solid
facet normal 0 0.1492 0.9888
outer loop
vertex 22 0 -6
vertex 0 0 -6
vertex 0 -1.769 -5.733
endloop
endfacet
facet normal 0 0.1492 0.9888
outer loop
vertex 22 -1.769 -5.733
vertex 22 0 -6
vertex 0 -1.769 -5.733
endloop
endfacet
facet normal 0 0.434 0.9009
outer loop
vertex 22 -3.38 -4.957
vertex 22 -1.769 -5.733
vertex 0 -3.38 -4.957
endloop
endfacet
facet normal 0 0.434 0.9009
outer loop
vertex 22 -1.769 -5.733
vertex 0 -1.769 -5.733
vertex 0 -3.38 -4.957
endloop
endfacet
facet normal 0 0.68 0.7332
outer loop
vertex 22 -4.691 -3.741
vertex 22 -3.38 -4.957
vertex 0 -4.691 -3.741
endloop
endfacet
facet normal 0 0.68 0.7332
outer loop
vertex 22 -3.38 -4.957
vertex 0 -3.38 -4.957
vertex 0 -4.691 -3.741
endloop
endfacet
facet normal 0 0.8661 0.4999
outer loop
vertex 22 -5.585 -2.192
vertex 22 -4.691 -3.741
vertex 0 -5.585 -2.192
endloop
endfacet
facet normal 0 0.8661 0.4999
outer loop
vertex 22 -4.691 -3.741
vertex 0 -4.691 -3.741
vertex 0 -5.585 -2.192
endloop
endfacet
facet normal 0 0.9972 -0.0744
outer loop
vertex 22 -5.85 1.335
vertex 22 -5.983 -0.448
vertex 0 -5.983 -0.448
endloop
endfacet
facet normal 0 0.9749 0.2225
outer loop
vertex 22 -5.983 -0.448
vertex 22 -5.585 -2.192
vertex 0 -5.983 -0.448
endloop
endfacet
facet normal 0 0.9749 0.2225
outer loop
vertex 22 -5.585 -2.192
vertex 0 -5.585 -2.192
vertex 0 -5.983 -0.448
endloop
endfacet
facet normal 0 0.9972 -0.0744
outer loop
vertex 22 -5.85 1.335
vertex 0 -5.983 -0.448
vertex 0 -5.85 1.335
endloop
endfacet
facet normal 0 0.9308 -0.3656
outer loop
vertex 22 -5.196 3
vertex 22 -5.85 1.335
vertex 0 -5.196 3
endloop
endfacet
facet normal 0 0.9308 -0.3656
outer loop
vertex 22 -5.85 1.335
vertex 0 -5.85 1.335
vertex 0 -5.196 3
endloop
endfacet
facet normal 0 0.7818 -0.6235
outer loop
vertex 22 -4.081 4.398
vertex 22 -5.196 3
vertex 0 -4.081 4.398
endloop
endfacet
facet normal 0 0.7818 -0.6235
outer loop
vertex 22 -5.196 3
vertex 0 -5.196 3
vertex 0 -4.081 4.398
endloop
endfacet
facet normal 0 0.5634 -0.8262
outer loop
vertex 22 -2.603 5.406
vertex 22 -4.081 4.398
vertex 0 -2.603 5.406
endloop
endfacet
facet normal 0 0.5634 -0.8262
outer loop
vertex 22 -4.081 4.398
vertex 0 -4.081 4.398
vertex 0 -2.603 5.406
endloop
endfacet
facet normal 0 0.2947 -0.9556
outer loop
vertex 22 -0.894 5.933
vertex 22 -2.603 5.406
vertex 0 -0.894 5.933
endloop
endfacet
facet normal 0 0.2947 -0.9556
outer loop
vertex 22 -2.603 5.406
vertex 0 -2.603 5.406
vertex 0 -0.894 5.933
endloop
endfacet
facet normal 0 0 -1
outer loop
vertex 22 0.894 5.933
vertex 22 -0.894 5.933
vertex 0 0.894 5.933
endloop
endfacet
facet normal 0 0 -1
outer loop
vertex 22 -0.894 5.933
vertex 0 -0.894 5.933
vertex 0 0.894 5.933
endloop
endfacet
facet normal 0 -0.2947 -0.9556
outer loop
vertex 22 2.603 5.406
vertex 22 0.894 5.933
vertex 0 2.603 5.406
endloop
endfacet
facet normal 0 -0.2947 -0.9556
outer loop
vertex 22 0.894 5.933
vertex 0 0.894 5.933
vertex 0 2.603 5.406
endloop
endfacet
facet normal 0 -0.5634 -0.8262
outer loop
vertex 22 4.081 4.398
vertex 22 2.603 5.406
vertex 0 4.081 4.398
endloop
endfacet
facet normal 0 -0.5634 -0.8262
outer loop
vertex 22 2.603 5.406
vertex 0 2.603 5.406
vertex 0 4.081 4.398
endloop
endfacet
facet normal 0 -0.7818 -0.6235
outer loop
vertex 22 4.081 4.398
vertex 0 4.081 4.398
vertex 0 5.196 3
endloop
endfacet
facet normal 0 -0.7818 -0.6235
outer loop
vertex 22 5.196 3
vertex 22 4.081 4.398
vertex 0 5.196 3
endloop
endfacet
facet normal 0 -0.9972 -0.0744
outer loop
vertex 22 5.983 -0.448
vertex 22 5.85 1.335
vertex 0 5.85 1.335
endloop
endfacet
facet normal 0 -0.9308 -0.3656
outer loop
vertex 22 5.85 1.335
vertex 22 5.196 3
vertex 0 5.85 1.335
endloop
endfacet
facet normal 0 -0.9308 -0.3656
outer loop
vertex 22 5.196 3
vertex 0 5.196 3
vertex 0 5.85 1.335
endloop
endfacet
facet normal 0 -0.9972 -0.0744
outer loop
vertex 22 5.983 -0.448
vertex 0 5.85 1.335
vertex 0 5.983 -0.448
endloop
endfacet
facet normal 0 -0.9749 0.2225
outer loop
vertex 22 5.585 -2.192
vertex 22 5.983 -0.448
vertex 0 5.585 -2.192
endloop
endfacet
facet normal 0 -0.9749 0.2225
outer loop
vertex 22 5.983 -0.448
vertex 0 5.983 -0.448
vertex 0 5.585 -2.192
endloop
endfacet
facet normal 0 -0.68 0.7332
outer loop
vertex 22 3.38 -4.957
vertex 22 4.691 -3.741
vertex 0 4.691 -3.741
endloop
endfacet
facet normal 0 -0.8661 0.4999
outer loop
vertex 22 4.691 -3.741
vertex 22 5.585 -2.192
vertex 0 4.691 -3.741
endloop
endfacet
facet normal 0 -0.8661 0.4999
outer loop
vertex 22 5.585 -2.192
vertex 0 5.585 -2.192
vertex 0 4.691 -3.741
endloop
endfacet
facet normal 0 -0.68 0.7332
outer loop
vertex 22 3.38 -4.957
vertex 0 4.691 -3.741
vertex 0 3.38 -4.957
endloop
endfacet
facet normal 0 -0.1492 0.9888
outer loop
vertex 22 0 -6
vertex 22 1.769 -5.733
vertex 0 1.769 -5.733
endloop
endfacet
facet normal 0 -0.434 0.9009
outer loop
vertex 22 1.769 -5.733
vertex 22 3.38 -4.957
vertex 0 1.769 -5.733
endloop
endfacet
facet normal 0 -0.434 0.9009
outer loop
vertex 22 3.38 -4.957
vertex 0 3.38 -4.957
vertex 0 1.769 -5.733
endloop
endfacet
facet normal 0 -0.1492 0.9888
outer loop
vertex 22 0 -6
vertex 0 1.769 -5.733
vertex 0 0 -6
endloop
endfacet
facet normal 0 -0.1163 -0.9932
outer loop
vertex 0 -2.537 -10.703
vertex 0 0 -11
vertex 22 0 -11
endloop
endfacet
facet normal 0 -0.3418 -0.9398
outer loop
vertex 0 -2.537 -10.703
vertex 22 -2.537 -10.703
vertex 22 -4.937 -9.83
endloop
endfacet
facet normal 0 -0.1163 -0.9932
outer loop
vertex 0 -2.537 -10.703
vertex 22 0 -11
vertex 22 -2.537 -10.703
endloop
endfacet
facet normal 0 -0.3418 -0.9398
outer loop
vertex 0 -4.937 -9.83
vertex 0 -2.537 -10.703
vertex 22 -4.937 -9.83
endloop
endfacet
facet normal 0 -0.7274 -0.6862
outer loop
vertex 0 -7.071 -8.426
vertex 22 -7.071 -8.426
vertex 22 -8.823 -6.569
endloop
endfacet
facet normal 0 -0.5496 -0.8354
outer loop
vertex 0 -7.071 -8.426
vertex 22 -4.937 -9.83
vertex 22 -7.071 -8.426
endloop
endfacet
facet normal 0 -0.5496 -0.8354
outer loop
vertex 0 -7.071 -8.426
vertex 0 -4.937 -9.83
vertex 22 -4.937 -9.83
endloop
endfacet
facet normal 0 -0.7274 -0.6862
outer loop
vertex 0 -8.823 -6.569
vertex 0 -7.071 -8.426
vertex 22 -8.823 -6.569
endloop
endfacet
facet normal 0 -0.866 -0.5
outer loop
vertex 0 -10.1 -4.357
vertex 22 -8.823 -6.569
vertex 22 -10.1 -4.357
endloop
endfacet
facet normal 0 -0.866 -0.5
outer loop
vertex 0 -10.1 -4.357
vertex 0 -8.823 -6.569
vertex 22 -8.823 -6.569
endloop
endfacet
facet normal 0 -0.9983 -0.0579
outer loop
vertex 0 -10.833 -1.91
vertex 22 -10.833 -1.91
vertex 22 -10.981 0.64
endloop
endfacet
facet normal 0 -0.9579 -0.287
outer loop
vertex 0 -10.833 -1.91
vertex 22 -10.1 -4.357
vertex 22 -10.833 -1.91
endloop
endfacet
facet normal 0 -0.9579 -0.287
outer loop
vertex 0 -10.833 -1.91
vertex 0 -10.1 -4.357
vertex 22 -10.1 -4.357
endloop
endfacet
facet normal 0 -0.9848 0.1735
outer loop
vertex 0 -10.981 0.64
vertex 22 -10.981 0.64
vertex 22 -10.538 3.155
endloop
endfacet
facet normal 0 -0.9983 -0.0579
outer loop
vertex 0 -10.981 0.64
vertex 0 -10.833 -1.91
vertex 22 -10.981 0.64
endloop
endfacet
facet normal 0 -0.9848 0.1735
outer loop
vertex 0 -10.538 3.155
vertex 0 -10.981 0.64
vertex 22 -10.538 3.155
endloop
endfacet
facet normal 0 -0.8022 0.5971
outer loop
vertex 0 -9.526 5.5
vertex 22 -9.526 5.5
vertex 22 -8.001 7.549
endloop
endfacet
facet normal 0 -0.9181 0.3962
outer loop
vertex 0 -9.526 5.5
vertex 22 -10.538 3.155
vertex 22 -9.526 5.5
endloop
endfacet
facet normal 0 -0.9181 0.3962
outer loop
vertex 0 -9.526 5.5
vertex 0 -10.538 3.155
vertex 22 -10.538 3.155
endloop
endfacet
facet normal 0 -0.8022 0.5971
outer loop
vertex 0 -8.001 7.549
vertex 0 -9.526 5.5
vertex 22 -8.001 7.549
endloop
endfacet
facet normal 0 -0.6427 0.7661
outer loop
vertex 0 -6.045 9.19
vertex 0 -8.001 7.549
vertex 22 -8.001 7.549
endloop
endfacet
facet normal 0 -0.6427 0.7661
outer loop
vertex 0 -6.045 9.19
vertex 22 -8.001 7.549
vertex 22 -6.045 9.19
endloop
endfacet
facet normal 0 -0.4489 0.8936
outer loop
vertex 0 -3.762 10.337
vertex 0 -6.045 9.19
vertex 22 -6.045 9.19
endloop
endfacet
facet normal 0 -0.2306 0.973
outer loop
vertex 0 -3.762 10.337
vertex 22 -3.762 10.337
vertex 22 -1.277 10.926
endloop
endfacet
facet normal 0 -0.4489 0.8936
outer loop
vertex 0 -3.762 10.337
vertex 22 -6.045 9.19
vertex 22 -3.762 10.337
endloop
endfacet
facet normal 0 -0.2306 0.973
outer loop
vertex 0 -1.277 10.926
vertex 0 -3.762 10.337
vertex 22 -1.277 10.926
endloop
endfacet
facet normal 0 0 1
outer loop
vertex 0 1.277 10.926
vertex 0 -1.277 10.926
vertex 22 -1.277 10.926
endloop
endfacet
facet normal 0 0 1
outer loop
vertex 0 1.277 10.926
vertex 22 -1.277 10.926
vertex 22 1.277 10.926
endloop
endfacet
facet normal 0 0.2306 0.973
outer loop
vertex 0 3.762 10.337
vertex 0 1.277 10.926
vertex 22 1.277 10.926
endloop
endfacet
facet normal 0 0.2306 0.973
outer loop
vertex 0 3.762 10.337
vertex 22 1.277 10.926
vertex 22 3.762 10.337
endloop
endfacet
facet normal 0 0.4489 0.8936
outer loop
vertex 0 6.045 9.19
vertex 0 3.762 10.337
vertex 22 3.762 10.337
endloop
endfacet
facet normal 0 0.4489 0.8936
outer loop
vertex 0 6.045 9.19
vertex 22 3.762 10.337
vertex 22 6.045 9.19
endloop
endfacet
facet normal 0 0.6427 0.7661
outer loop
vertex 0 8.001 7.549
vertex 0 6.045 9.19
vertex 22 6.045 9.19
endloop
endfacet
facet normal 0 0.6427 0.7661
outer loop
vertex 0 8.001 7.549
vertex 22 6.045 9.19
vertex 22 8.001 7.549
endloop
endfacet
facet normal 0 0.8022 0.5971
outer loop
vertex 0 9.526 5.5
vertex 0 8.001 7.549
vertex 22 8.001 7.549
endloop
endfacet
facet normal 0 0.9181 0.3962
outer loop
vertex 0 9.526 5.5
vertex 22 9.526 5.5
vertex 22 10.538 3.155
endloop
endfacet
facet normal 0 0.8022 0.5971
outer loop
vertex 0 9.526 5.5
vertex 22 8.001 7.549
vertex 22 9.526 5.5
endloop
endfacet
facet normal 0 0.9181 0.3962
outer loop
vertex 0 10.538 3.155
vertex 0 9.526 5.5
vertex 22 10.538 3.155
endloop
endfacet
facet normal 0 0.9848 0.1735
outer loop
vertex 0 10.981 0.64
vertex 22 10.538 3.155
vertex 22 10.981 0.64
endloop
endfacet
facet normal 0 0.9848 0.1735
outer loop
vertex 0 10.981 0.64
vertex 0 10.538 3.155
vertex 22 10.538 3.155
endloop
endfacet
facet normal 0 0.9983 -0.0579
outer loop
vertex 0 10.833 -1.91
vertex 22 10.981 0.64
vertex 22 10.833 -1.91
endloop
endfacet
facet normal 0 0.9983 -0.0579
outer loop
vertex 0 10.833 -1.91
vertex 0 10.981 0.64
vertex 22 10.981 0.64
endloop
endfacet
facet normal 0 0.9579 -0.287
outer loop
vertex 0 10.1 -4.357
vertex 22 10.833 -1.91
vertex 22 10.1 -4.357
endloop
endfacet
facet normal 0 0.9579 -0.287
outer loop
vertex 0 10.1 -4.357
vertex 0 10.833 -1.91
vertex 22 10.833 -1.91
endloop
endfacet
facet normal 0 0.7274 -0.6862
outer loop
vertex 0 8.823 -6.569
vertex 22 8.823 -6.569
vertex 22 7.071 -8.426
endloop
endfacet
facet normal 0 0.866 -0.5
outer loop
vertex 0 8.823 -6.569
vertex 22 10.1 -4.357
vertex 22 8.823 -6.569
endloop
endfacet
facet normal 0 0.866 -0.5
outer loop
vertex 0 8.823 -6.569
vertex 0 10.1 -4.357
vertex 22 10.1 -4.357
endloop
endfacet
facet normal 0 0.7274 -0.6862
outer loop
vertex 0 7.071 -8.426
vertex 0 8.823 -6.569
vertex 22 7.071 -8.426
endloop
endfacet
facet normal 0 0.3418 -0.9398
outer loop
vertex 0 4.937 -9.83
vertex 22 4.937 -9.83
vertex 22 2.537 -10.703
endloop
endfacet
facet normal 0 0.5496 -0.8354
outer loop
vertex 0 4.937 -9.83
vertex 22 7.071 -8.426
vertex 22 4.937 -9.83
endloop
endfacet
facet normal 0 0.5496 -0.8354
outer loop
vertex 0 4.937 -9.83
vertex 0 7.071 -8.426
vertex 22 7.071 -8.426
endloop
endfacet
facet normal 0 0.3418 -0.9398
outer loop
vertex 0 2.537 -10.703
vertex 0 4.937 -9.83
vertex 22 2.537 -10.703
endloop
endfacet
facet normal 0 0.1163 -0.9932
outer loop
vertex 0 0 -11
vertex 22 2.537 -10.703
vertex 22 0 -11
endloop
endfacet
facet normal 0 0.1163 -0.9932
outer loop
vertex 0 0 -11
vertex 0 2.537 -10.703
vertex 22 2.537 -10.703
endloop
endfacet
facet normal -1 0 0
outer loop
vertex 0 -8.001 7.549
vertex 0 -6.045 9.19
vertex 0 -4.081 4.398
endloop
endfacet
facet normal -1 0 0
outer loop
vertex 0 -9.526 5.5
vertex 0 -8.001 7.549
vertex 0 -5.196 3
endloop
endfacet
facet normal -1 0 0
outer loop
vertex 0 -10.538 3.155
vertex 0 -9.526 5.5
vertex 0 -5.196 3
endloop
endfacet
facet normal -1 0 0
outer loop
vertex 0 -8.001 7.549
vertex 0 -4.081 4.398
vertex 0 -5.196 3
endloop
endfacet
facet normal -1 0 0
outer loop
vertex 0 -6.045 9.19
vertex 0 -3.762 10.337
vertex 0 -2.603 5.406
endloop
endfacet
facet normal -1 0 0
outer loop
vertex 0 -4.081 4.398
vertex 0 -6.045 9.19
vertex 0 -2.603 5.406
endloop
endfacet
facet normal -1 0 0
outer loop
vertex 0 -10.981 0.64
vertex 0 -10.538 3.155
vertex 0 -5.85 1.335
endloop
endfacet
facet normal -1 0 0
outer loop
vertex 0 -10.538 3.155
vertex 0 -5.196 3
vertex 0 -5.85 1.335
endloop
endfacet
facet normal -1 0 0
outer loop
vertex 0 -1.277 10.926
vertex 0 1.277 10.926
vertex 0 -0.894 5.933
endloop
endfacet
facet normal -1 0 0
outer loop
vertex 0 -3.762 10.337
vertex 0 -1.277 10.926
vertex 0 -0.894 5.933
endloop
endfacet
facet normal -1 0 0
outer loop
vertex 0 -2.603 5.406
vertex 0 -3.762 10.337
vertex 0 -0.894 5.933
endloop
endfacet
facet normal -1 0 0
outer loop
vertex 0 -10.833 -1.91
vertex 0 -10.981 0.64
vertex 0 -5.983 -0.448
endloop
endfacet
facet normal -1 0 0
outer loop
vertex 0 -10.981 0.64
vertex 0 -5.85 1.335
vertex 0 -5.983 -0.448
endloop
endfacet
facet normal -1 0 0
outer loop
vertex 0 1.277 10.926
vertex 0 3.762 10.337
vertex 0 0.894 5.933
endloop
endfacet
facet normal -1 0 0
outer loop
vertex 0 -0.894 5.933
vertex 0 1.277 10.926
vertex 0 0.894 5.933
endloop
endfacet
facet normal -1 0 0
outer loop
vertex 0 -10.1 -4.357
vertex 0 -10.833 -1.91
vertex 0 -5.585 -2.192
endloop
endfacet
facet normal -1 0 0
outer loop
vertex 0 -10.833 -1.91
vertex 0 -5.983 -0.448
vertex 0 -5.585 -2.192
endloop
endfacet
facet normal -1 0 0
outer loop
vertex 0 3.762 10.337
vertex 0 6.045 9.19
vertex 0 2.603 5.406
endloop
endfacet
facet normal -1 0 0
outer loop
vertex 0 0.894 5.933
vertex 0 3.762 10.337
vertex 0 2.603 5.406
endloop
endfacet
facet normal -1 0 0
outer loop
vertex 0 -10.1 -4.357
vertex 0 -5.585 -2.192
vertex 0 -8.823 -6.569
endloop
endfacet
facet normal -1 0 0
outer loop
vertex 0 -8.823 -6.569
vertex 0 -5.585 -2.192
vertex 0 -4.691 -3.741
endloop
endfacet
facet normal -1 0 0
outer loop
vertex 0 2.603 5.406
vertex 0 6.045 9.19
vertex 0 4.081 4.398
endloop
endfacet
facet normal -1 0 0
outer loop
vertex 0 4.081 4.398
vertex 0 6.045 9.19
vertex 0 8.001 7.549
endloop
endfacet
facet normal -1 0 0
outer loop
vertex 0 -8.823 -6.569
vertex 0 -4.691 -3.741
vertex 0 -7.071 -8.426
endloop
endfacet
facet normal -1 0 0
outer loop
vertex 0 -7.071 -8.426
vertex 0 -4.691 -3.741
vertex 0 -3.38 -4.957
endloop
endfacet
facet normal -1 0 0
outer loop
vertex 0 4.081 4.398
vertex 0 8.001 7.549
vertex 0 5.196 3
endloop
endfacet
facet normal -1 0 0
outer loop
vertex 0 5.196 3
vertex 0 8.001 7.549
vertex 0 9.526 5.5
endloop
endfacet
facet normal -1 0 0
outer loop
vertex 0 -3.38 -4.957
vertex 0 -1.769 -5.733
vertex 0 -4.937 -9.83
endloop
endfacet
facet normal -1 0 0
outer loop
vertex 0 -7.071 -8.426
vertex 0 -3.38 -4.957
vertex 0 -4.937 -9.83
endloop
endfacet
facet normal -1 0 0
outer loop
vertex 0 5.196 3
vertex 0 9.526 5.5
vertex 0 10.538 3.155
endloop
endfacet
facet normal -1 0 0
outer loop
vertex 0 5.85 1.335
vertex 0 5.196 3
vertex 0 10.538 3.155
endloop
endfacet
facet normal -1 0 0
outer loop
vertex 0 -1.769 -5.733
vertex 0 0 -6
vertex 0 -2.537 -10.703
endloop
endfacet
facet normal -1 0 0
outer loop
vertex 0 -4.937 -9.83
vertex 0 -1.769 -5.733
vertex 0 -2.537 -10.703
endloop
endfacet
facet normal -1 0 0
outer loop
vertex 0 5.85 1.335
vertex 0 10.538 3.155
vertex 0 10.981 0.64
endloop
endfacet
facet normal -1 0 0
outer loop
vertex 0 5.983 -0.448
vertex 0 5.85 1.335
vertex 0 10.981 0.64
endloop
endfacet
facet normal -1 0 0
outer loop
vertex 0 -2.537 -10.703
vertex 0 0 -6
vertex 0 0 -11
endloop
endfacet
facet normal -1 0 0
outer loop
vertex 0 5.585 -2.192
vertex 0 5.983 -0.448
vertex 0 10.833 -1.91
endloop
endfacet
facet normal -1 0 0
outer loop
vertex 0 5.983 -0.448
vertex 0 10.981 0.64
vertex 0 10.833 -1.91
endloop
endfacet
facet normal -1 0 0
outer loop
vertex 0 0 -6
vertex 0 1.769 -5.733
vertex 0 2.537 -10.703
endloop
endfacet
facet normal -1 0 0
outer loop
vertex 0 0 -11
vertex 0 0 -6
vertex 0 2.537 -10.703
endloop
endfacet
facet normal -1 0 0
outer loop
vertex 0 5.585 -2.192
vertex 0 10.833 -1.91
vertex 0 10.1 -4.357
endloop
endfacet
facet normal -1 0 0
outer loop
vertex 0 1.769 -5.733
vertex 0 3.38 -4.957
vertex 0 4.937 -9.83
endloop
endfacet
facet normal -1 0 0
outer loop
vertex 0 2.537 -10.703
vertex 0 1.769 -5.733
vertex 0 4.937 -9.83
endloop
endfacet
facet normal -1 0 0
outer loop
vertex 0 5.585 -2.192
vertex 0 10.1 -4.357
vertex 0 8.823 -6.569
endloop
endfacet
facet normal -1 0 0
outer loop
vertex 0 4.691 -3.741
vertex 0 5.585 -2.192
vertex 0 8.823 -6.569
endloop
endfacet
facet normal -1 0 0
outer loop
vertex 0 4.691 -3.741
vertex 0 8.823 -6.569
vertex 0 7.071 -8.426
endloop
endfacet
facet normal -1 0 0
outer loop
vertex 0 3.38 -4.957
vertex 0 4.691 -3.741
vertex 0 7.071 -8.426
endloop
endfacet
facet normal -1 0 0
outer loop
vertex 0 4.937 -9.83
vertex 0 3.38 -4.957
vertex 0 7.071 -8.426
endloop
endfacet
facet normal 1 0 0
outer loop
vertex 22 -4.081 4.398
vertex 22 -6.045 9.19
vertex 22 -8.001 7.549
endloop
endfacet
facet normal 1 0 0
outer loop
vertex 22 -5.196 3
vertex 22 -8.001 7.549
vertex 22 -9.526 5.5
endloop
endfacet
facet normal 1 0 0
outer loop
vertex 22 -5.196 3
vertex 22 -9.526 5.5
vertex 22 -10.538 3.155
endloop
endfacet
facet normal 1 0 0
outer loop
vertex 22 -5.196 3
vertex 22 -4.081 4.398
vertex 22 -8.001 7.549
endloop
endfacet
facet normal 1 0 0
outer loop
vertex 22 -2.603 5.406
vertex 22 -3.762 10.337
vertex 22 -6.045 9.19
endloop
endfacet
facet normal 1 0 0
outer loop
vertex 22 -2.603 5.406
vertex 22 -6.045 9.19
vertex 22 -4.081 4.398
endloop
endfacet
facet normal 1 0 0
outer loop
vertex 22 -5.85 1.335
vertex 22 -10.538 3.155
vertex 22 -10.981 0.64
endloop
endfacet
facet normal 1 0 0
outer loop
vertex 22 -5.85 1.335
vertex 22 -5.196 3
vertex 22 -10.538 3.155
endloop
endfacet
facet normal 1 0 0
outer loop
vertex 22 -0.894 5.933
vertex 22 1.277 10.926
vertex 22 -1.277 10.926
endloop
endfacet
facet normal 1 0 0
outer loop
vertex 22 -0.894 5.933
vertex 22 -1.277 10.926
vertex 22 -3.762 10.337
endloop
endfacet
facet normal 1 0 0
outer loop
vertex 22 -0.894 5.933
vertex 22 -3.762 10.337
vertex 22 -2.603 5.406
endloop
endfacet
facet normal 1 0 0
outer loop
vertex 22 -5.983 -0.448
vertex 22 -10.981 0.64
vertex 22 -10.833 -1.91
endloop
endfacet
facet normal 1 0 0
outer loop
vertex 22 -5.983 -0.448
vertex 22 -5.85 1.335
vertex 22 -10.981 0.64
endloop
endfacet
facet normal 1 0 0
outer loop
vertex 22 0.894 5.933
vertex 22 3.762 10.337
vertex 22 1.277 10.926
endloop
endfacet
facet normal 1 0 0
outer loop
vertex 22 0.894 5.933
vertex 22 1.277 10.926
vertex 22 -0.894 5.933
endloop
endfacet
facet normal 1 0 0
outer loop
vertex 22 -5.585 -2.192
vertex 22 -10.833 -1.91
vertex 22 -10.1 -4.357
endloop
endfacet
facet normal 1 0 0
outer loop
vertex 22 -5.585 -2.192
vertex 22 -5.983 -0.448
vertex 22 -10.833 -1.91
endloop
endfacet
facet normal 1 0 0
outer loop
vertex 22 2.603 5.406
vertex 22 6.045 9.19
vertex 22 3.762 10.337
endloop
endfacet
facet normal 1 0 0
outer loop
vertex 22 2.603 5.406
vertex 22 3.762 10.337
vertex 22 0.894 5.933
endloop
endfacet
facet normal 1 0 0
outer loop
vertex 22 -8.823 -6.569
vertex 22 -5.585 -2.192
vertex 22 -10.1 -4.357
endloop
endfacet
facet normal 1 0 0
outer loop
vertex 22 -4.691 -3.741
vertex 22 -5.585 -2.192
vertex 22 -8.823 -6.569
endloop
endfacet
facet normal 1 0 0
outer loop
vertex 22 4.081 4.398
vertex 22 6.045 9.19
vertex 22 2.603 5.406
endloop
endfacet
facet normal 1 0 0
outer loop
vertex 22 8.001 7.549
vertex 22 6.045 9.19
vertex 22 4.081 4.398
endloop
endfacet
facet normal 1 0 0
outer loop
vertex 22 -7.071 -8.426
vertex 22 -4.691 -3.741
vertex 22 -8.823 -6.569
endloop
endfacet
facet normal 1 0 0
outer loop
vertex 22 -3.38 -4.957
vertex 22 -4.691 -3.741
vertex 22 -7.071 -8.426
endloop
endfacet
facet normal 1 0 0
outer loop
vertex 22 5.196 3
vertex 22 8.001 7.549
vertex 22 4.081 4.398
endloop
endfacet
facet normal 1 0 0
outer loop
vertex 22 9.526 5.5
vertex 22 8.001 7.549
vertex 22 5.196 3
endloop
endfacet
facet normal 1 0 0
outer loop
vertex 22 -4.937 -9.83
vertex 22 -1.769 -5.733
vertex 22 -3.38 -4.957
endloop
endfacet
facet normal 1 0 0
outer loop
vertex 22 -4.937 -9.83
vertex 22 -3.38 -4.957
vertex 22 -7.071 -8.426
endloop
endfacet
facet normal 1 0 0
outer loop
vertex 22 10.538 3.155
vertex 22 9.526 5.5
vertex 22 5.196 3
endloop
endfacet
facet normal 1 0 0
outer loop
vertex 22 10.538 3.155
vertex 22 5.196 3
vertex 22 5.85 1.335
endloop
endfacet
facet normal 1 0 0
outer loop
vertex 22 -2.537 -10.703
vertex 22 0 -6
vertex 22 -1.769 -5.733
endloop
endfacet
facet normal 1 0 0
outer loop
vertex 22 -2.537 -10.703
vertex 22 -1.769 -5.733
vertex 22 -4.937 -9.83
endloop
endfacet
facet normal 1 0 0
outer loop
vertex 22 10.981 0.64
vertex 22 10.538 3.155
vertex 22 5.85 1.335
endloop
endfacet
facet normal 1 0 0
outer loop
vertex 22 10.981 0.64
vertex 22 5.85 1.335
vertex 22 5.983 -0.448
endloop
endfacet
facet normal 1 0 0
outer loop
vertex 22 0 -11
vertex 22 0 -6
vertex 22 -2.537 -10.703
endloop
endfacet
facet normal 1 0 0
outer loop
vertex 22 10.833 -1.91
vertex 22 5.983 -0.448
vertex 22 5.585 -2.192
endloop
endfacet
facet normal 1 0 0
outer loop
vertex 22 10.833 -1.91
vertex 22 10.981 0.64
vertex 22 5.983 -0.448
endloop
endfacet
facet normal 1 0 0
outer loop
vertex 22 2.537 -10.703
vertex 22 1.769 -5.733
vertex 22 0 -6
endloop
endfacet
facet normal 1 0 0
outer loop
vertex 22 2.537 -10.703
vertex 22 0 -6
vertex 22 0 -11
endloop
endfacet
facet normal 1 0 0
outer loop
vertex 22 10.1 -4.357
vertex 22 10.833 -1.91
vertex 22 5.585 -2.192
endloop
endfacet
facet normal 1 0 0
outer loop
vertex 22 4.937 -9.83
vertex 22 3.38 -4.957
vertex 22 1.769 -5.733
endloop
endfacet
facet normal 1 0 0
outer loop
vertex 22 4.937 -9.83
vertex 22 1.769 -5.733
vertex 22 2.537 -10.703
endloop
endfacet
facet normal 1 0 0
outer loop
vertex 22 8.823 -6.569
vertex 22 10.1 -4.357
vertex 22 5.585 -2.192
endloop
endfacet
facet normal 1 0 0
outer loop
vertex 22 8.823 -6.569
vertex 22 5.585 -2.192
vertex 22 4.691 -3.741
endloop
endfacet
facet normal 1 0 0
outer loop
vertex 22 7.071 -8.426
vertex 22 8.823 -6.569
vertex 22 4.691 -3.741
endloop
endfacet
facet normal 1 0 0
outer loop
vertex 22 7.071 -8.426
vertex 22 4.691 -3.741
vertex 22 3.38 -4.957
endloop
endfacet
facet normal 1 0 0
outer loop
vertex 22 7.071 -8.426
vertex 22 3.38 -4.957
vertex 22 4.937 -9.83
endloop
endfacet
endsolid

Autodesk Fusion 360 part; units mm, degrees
sketch "Sketch1" plane through (0, 0, 0) normal (1, 0, 0) x (0, 0, -1)
  circle A0 centre (0, 0) radius 6
  circle A1 centre (0, 0) radius 11
  dimension "d1" = 12
  dimension "d2" = 22
extrude "Extrude1" add sketch "Sketch1" along normal blind 22 makes body 1
copy_body "Body->Comp1" bodies 1 removing the originals makes body 2 in component "12x22x22 bushing"
component "12x22x22 bushing" placed x (1, 0, 0) y (0, 1, 0) z (0, 0, 1) at (0, 0, 0)
